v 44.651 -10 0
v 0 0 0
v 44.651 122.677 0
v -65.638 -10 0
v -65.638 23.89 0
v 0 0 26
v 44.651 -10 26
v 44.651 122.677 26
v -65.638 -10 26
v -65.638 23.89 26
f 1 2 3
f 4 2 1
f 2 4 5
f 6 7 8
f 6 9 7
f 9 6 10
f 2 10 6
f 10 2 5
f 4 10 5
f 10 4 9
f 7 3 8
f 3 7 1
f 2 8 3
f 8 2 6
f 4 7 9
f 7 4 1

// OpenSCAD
// configurable case riser wedges
//   for vase mode printing
//

// make noise 104hp case, 80deg riser wedge
d = 26; // width of riser (mm)
x = 130.55; // case dimensions (mm)
y =  69.85;
z = 546.10; 
t = 70; // 'theta', angle of rotation (degrees)
r = 10; // rise in (mm)

// norns 45deg riser wedge
/*
d = 90;
x = 80;
y = 90;
z = 43; 
t = 45;
r = 10;
*/

module case() {
  p = [[0, 0], [x, 0], [x, y], [0, y]];
  rotate([0, 0, t])
    polygon(points=p, paths=[[0, 1, 2, 3]], convexity=10);
}

module wedge(x, y, depth) {
  p1_0 = [0, 0];
  p1_1 = [x, 0];
  p1_2 = [x, y];
  p1 = [p1_0, p1_1, p1_2];
  linear_extrude(depth)
    polygon(points=p1, paths=[[0, 1, 2]], convexity=10);
}

module rect(x1, x2, depth) {
  p0 = [ x1, -r];
  p1 = [ x1,  0];
  p2 = [ x2,  0];
  p3 = [ x2, -r];
  p = [p0, p1, p2, p3];
  linear_extrude(depth)
    polygon(points=p, paths=[[0, 1, 2, 3]], convexity=10);
}

module riser() {
  // calculate rotation of first and third corners to produce the riser
  x1 = -sin(t) * y; y1 =  cos(t) * y;
  wedge(x1, y1, d);
  x2 = cos(t) * x; y2 = sin(t) * x;
  wedge(x2, y2, d);
  // create the base
  rect(x1, x2, d);
}

// case();
riser();
